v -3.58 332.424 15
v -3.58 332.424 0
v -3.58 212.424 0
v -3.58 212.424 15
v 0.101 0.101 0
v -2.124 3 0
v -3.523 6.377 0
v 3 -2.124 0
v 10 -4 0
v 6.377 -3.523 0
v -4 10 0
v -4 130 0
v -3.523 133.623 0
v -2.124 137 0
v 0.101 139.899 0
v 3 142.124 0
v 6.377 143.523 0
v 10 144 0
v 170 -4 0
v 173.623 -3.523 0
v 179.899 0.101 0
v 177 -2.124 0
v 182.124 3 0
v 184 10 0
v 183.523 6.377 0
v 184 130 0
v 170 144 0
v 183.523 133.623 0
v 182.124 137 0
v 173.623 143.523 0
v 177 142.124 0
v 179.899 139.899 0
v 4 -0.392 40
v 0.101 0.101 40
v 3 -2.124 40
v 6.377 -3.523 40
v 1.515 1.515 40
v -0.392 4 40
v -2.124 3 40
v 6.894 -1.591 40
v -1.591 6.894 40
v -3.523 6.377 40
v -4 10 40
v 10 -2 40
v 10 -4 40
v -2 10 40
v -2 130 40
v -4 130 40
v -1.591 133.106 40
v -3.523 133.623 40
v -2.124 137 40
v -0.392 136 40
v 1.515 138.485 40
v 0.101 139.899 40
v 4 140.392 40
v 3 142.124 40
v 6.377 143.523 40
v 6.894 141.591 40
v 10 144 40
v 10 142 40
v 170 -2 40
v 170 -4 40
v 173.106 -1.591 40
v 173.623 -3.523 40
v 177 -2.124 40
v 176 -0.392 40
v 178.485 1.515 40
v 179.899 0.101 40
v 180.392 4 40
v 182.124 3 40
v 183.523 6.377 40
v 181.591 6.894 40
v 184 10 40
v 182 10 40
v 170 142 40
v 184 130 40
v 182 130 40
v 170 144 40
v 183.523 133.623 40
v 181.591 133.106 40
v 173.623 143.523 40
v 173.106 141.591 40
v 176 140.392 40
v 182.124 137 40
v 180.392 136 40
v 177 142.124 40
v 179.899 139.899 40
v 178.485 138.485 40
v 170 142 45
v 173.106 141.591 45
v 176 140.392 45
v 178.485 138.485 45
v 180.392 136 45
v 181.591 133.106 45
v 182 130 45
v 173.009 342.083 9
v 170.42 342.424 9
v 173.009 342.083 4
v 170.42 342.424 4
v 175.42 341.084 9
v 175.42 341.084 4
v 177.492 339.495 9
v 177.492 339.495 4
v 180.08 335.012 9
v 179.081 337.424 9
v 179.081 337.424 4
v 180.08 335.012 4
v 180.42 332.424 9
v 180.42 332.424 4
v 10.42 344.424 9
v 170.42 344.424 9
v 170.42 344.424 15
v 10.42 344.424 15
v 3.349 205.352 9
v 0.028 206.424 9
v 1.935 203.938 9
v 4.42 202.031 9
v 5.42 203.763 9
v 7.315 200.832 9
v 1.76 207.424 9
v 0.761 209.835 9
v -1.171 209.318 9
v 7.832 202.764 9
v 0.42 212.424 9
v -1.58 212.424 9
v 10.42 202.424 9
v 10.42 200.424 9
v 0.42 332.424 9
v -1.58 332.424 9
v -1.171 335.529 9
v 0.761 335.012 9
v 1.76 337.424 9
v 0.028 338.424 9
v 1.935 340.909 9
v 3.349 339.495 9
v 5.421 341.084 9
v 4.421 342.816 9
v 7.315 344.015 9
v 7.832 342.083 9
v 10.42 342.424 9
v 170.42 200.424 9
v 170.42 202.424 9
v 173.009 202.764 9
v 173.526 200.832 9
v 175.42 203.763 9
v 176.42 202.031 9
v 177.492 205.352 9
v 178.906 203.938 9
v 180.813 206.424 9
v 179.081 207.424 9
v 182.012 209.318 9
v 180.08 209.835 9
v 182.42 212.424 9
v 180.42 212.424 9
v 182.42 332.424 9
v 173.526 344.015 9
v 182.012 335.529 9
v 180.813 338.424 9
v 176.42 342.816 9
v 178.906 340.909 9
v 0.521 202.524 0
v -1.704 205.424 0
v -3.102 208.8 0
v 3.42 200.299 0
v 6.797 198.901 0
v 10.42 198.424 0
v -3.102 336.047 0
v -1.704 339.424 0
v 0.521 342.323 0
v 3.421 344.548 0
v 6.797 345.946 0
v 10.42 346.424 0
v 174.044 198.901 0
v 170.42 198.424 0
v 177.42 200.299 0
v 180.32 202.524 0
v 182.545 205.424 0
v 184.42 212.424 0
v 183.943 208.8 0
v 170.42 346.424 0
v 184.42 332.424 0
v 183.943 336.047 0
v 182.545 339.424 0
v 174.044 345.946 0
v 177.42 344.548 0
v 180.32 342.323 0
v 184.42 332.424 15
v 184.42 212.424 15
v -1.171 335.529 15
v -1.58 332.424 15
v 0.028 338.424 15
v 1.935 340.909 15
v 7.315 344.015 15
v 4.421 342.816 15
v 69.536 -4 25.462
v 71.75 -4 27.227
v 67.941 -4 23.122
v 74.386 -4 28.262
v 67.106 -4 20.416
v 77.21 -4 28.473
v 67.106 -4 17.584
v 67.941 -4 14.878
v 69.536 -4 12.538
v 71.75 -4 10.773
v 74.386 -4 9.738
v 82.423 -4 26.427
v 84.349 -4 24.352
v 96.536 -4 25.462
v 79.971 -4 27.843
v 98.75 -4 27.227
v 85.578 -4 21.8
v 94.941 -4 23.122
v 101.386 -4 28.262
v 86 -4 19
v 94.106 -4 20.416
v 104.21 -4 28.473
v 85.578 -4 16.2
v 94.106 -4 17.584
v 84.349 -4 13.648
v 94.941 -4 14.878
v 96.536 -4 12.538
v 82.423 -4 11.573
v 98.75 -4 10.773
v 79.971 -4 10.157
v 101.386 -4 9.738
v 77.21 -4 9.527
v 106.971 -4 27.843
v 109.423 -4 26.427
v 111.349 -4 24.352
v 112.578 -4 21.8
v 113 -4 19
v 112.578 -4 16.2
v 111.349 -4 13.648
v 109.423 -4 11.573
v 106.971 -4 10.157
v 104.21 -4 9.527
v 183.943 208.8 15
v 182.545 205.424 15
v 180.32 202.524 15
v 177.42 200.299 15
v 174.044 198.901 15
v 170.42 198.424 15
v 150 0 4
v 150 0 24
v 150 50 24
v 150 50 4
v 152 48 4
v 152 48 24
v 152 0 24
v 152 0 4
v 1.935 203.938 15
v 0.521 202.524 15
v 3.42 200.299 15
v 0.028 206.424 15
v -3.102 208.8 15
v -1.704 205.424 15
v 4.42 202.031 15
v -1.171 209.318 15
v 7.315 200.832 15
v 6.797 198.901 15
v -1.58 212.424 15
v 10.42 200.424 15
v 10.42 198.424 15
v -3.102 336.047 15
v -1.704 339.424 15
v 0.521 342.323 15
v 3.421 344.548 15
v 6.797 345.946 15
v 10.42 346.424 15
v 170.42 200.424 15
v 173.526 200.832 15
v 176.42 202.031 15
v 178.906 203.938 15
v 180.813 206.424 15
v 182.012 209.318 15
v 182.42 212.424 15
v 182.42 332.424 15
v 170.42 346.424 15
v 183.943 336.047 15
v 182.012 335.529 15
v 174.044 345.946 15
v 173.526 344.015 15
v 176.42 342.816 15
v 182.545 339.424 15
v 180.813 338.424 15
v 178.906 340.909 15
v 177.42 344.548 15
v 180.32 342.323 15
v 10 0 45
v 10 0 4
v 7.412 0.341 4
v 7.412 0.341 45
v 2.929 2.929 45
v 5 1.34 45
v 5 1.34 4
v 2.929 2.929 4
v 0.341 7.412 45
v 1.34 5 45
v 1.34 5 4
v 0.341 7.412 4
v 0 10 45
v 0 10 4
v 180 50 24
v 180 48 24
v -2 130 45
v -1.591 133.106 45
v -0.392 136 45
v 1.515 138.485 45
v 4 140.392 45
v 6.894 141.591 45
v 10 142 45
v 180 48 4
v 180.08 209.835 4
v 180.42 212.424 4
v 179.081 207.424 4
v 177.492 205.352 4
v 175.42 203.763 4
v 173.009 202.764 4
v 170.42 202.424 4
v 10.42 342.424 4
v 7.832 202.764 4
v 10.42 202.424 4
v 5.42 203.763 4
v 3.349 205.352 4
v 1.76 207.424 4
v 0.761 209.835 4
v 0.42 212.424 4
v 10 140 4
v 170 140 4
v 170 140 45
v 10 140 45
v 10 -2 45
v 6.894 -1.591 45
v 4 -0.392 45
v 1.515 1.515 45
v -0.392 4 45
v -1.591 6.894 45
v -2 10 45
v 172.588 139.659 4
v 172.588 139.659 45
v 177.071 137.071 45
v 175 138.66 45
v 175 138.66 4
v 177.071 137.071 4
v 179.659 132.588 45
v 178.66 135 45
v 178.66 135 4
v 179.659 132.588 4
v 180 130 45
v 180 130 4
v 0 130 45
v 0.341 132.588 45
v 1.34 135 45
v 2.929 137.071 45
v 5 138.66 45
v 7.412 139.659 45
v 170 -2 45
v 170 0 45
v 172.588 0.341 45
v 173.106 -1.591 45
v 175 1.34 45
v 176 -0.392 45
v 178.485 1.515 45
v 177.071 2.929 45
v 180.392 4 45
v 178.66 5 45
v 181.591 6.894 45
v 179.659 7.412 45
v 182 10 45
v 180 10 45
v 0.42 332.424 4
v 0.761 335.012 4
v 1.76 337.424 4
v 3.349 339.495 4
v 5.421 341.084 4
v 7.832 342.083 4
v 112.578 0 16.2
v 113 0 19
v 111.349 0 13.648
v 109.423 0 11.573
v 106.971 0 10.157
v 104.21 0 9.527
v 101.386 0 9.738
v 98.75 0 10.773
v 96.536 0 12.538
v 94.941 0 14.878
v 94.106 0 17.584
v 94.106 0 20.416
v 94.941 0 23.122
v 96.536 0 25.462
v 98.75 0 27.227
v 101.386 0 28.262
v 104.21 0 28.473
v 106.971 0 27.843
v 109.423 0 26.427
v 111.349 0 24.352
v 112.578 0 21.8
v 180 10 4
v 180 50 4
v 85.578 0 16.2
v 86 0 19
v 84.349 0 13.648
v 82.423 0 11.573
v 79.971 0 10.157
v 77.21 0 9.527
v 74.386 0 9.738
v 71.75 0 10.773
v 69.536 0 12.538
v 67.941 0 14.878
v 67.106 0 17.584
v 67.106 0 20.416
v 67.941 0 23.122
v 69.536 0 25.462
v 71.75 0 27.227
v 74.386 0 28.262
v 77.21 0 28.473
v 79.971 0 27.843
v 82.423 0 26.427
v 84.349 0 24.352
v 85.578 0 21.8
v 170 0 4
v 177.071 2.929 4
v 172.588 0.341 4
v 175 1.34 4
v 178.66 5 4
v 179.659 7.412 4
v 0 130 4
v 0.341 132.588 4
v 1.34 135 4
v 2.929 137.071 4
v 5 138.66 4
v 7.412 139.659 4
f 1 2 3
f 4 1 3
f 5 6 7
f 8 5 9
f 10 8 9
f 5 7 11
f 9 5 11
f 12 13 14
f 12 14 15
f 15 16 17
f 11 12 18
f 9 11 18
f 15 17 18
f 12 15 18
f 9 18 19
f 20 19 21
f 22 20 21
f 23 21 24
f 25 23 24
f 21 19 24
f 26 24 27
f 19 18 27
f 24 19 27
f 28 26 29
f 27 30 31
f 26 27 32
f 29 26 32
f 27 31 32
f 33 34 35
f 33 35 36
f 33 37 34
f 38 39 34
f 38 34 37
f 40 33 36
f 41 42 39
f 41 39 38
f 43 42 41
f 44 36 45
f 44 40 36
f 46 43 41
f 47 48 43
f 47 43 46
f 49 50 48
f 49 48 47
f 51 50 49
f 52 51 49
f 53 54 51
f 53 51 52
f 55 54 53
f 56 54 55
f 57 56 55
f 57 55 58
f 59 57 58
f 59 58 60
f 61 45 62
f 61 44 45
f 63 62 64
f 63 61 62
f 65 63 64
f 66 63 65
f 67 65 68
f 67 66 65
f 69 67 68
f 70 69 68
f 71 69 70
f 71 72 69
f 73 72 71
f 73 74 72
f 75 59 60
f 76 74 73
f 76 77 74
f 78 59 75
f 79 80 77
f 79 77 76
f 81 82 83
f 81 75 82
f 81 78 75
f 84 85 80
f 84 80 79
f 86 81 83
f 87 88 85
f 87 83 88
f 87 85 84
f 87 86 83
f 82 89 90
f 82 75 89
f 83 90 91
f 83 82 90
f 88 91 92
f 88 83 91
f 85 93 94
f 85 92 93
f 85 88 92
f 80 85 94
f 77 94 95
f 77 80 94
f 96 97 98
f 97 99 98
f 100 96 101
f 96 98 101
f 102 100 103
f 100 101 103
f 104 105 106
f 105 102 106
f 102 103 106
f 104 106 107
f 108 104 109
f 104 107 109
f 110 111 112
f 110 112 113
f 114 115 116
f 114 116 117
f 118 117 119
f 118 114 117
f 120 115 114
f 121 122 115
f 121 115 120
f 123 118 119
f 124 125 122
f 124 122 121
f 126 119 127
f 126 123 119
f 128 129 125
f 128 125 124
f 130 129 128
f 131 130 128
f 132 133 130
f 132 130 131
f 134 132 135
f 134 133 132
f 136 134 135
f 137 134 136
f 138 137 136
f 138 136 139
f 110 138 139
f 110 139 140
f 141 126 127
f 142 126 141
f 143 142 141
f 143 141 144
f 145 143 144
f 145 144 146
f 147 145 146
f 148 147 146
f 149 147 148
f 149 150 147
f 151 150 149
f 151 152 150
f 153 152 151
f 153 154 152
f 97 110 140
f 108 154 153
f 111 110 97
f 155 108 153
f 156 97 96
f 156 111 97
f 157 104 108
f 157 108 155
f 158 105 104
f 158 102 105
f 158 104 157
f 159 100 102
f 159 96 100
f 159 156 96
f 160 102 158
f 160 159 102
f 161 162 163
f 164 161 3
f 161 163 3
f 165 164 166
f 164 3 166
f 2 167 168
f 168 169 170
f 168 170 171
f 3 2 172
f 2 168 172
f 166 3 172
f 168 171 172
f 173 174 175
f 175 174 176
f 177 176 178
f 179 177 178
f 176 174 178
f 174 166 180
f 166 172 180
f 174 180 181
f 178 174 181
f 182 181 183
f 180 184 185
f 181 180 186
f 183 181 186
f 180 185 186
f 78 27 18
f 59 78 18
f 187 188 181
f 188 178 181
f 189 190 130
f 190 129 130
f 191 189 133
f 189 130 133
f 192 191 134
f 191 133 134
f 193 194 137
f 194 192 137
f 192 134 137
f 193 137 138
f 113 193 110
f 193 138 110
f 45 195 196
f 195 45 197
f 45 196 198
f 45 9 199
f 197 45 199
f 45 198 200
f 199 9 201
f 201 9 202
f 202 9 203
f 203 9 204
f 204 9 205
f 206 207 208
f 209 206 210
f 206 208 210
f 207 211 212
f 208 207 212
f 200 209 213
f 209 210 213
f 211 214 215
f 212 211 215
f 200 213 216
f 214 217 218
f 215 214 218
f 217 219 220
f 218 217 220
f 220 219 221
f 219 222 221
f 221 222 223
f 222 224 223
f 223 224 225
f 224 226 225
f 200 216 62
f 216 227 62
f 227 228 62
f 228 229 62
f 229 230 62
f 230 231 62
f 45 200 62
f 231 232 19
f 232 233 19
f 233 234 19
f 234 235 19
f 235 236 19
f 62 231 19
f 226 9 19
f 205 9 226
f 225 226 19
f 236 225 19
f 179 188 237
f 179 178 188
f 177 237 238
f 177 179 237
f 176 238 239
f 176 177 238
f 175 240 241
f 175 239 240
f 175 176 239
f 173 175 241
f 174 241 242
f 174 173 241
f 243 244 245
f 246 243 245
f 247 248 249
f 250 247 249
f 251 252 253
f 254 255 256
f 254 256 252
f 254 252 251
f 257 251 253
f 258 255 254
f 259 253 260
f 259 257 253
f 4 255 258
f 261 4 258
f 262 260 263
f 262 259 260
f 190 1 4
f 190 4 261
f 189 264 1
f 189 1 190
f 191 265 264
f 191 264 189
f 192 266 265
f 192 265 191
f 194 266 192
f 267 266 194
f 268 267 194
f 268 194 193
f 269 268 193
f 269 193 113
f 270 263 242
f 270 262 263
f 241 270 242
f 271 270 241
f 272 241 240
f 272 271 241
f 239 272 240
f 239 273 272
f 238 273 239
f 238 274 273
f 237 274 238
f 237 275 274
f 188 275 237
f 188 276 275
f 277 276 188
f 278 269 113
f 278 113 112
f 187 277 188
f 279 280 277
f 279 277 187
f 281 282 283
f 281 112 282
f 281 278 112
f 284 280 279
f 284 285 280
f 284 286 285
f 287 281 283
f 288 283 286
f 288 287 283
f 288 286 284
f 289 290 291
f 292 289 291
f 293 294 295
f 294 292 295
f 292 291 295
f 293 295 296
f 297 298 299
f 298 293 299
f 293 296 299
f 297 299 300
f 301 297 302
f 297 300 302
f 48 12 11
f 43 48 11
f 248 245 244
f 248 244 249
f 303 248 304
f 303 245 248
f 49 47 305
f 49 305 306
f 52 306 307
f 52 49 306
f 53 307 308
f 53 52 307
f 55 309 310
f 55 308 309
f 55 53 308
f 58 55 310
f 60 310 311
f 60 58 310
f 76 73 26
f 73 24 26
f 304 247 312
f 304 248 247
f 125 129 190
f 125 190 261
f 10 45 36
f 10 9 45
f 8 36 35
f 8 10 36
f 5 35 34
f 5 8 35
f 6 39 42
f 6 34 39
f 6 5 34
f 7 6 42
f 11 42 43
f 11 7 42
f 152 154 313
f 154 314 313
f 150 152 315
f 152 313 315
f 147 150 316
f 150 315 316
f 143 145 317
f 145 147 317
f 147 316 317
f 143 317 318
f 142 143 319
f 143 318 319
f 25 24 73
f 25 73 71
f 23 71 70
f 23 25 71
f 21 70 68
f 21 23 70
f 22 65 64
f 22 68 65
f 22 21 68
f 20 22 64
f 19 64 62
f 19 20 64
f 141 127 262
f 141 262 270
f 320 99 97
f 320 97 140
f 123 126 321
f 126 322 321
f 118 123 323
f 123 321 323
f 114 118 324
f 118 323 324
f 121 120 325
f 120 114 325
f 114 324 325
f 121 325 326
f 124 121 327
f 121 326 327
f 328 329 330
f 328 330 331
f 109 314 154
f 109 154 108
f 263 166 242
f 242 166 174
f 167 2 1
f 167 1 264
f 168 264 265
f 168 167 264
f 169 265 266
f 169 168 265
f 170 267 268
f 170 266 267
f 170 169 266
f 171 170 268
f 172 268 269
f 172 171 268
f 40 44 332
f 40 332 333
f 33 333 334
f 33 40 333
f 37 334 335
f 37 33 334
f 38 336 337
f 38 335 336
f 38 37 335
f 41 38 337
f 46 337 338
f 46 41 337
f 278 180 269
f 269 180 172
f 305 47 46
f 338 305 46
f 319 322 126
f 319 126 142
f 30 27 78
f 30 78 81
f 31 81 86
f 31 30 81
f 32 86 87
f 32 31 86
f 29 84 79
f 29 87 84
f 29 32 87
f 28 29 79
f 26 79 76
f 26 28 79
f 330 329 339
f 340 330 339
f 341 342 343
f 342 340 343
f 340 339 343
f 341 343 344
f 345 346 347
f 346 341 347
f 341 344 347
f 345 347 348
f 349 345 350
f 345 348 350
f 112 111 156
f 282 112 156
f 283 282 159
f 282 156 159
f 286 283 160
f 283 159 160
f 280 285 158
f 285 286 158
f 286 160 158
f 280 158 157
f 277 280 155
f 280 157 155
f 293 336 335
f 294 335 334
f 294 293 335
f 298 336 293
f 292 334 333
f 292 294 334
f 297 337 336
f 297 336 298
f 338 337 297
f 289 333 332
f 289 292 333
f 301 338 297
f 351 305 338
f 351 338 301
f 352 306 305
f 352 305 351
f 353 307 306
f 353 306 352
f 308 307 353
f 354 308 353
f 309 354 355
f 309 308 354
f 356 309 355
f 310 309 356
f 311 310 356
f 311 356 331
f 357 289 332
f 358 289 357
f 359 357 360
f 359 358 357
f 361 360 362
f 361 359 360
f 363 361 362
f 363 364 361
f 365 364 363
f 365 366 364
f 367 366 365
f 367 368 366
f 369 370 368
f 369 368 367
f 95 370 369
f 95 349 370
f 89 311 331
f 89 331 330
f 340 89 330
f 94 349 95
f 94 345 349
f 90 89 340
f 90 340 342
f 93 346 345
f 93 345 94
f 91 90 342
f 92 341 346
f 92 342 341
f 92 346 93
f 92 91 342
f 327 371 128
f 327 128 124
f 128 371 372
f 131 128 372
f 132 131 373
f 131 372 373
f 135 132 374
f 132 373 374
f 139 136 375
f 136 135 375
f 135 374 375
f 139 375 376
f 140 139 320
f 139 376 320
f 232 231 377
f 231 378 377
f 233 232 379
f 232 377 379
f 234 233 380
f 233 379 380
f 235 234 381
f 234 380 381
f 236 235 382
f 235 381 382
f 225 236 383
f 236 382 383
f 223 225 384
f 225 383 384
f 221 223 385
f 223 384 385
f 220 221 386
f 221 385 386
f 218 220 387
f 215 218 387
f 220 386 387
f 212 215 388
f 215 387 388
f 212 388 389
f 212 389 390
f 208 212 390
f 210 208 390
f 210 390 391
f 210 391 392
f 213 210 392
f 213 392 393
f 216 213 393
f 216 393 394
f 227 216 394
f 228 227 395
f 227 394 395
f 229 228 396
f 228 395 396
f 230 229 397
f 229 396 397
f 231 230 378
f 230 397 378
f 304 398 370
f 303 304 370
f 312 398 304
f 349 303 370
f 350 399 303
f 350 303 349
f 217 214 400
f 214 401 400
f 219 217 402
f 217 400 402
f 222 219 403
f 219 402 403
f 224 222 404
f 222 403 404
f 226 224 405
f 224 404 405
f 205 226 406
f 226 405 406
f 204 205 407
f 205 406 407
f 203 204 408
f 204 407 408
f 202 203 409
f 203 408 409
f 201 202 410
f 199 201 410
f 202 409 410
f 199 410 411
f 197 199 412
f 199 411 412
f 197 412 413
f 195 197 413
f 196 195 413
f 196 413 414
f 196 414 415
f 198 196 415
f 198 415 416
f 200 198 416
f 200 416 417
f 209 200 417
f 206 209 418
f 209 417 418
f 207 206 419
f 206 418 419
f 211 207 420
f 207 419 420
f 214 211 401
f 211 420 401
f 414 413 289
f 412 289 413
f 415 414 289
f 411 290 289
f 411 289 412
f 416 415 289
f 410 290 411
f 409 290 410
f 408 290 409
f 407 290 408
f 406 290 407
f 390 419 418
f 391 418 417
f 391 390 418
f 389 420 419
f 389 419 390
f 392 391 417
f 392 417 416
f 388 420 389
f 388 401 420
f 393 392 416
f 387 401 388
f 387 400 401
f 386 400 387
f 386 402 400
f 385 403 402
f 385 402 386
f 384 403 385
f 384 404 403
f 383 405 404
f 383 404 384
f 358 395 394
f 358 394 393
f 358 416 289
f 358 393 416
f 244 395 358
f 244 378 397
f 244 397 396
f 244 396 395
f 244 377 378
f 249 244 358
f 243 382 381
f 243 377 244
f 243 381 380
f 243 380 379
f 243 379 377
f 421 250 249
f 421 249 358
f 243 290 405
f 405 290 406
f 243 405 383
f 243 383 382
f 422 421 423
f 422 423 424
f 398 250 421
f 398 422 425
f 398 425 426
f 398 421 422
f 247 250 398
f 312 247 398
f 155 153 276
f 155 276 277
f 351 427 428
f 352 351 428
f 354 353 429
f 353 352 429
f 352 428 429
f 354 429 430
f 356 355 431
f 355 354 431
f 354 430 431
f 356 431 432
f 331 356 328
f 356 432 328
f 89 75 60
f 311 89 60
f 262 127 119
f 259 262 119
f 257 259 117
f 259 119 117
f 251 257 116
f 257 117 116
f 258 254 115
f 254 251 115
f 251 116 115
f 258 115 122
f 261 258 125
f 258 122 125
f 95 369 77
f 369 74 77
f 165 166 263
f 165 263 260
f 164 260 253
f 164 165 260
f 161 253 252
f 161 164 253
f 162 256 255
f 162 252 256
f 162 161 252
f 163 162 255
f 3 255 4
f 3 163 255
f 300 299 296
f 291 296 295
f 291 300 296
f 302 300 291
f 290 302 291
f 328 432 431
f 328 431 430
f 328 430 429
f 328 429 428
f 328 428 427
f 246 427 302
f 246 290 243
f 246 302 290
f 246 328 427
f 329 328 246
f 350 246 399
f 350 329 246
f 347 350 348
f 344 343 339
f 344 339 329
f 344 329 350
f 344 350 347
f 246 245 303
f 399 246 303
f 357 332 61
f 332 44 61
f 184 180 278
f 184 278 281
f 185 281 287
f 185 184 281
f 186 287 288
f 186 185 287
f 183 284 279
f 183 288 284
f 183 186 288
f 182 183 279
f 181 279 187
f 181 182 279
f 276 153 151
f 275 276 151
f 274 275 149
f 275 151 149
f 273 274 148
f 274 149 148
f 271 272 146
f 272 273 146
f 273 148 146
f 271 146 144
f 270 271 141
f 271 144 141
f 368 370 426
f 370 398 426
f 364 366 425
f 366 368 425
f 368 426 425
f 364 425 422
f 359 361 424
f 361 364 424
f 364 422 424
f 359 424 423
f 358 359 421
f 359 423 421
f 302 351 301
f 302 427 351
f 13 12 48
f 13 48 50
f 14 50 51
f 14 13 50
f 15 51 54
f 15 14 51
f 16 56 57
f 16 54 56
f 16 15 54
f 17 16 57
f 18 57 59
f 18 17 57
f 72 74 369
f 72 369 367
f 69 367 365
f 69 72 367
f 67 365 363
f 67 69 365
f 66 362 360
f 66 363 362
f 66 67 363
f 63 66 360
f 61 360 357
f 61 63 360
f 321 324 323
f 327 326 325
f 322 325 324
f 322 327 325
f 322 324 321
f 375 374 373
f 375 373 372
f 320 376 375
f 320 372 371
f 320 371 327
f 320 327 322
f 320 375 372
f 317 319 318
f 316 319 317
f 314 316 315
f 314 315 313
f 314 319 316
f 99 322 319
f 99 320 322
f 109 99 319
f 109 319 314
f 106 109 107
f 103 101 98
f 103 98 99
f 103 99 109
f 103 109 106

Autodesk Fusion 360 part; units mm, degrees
sketch "Sketch1" plane through (0, 0, 0) normal (0, 0, 1) x (1, 0, 0)
  line L0 (10, 0) -> (170, 0)
  line L1 (180, 10) -> (180, 130)
  line L2 (170, 140) -> (10, 140)
  line L3 (0, 130) -> (0, 10)
  arc A0 (10, 140) -> (0, 130) centre (10, 130) ccw
  arc A1 (0, 10) -> (10, 0) centre (10, 10) ccw
  arc A2 (170, 0) -> (180, 10) centre (170, 10) ccw
  arc A3 (180, 130) -> (170, 140) centre (170, 130) ccw
  arc A4 (180, 130) -> (170, 140) centre (170, 130) ccw
  arc A5 (170, 0) -> (180, 10) centre (170, 10) ccw
  line L4 (-4, 130) -> (-4, 10)
  arc A6 (-4, 10) -> (10, -4) centre (10, 10) ccw
  line L5 (10, -4) -> (170, -4)
  arc A7 (170, -4) -> (184, 10) centre (170, 10) ccw
  line L6 (184, 10) -> (184, 130)
  arc A8 (184, 130) -> (170, 144) centre (170, 130) ccw
  line L7 (170, 144) -> (10, 144)
  arc A9 (10, 144) -> (-4, 130) centre (10, 130) ccw
  line L8 (-2, 130) -> (-2, 10)
  arc A10 (-2, 10) -> (10, -2) centre (10, 10) ccw
  line L9 (10, -2) -> (170, -2)
  arc A11 (170, -2) -> (182, 10) centre (170, 10) ccw
  line L10 (182, 10) -> (182, 130)
  arc A12 (182, 130) -> (170, 142) centre (170, 130) ccw
  line L11 (170, 142) -> (10, 142)
  arc A13 (10, 142) -> (-2, 130) centre (10, 130) ccw
  arc A14 (10, 142) -> (-2, 130) centre (10, 130) ccw
  arc A15 (170, -2) -> (182, 10) centre (170, 10) ccw
  line L12 (0, 130) -> (0, 10)
  line L13 (10, -4) -> (170, -4)
  arc A16 (170, 0) -> (180, 10) centre (170, 10) ccw
  line L14 (-4, 130) -> (-4, 10)
  line L15 (170, 144) -> (10, 144)
  arc A17 (184, 130) -> (170, 144) centre (170, 130) ccw
  arc A18 (10, 144) -> (-4, 130) centre (10, 130) ccw
  line L16 (10, 0) -> (170, 0)
  line L17 (-2, 130) -> (-2, 10)
  arc A19 (182, 130) -> (170, 142) centre (170, 130) ccw
  arc A20 (180, 130) -> (170, 140) centre (170, 130) ccw
  arc A21 (0, 10) -> (10, 0) centre (10, 10) ccw
  line L18 (10, -2) -> (170, -2)
  line L19 (170, 140) -> (10, 140)
  arc A22 (170, -4) -> (184, 10) centre (170, 10) ccw
  line L20 (170, 142) -> (10, 142)
  line L21 (180, 10) -> (180, 130)
  line L22 (182, 10) -> (182, 130)
  arc A23 (180, 130) -> (170, 140) centre (170, 130) ccw
  line L23 (184, 10) -> (184, 130)
  arc A24 (-4, 10) -> (10, -4) centre (10, 10) ccw
  arc A25 (10, 140) -> (0, 130) centre (10, 130) ccw
  arc A26 (170, 0) -> (180, 10) centre (170, 10) ccw
  arc A27 (-2, 10) -> (10, -2) centre (10, 10) ccw
  arc A28 (10.4205, 344.4235) -> (-1.5795, 332.4235) centre (10.4205, 332.4235) ccw
  arc A29 (170.4205, 200.4235) -> (182.4205, 212.4235) centre (170.4205, 212.4235) ccw
  line L24 (0.4205, 332.4235) -> (0.4205, 212.4235)
  line L25 (10.4205, 198.4235) -> (170.4205, 198.4235)
  arc A30 (170.4205, 202.4235) -> (180.4205, 212.4235) centre (170.4205, 212.4235) ccw
  line L26 (-3.5795, 332.4235) -> (-3.5795, 212.4235)
  line L27 (170.4205, 346.4235) -> (10.4205, 346.4235)
  arc A31 (184.4205, 332.4235) -> (170.4205, 346.4235) centre (170.4205, 332.4235) ccw
  arc A32 (10.4205, 346.4235) -> (-3.5795, 332.4235) centre (10.4205, 332.4235) ccw
  line L28 (10.4205, 202.4235) -> (170.4205, 202.4235)
  line L29 (-1.5795, 332.4235) -> (-1.5795, 212.4235)
  arc A33 (182.4205, 332.4235) -> (170.4205, 344.4235) centre (170.4205, 332.4235) ccw
  arc A34 (180.4205, 332.4235) -> (170.4205, 342.4235) centre (170.4205, 332.4235) ccw
  arc A35 (0.4205, 212.4235) -> (10.4205, 202.4235) centre (10.4205, 212.4235) ccw
  line L30 (10.4205, 200.4235) -> (170.4205, 200.4235)
  line L31 (170.4205, 342.4235) -> (10.4205, 342.4235)
  arc A36 (170.4205, 198.4235) -> (184.4205, 212.4235) centre (170.4205, 212.4235) ccw
  line L32 (170.4205, 344.4235) -> (10.4205, 344.4235)
  line L33 (180.4205, 212.4235) -> (180.4205, 332.4235)
  line L34 (182.4205, 212.4235) -> (182.4205, 332.4235)
  arc A37 (180.4205, 332.4235) -> (170.4205, 342.4235) centre (170.4205, 332.4235) ccw
  line L35 (184.4205, 212.4235) -> (184.4205, 332.4235)
  arc A38 (-3.5795, 212.4235) -> (10.4205, 198.4235) centre (10.4205, 212.4235) ccw
  arc A39 (10.4205, 342.4235) -> (0.4205, 332.4235) centre (10.4205, 332.4235) ccw
  arc A40 (170.4205, 202.4235) -> (180.4205, 212.4235) centre (170.4205, 212.4235) ccw
  arc A41 (-1.5795, 212.4235) -> (10.4205, 200.4235) centre (10.4205, 212.4235) ccw
  point P0 (180, 0)
  point P1 (180, 140)
  point P2 (0, 140)
  point P3 (180, 140)
  point P4 (0, 140)
  point P5 (180, 0)
  point P6 (180.4205, 342.4235)
  point P7 (0.4205, 342.4235)
  point P8 (0.4205, 202.4235)
  point P9 (180.4205, 202.4235)
  dimension "d1" = 140
  dimension "d2" = 180
  dimension "d3" = 10
  dimension "d4" = 4
  dimension "d5" = 2
  dimension "d6" = 4
  dimension "d7" = 2
  dimension "d8" = 140
  dimension "d9" = 180
  dimension "d10" = 10
  dimension "d11" = 4
  dimension "d12" = 2
  dimension "d13" = 140
  dimension "d14" = 180
  dimension "d15" = 10
extrude "Extrude1" add sketch "Sketch1" along normal blind 4 contours L0 L1 L2 L3 A0 A1 A2 A3 A4 A5 L12 A16 L16 A20 A21 L19 L21 A23 A25 A26 | L24 A30 L28 A34 A35 L31 L33 A37 A39 A40 makes body 1 at (63.3333, 93.3333, 0) makes body 2 at (117.0871, 249.0901, 0)
extrude "Extrude2" add sketch "Sketch1" along normal blind 45 contours L8 A10 L9 A11 L10 A12 L11 A13 A14 A15 L17 A19 L18 L20 L22 A27 bodies 1
extrude "Extrude3" add sketch "Sketch1" along normal blind 40 contours L4 A6 L5 A7 L6 A8 L7 A9 L13 L14 L15 A17 A18 A22 L23 A24 bodies 1
extrude "Extrude4" add sketch "Sketch1" along normal blind 9 contours A28 A29 L29 A33 L30 L32 L34 A41 bodies 2
extrude "Extrude5" add sketch "Sketch1" along normal blind 15 contours L25 L26 L27 A31 A32 A36 L35 A38 bodies 2
sketch "Sketch2" plane through (0, 0, 0) normal (0, 1, 0) x (1, 0, 0)
  line L0 (10, -40) -> (170, -40) construction
  line L1 (90, -40) -> (90, -4) construction
  line L2 (90, -4) -> (90, -19) construction
  line L3 (76.5, -19) -> (103.5, -19)
  circle A0 centre (76.5, -19) radius 9.5
  circle A1 centre (103.5, -19) radius 9.5
  dimension "d27" = 15
  dimension "d28" = 27
  dimension "d29" = 19
  dimension "d30" = 19
extrude "Extrude6" cut sketch "Sketch2" against normal blind 4 bodies 1
sketch "Sketch3" plane through (0, 0, 0) normal (0, 0, 1) x (1, 0, 0)
  line L0 (103.6272, 0) -> (72.8355, 0)
  line L1 (72.8355, 0) -> (72.8355, 50)
  line L2 (72.8355, 50) -> (103.6272, 50)
  line L3 (103.6272, 50) -> (103.6272, 0)
  dimension "d33" = 50
ref_plane "WorkPlane1" through (90, 70, 24) normal (0, 0, 1) x (1, 0, 0)
sketch "Sketch4" plane through (90, 70, 24) normal (0, 0, 1) x (1, 0, 0)
  line L0 (90, -70) -> (60, -70)
  line L1 (60, -70) -> (60, -20)
  line L2 (60, -20) -> (90, -20)
  line L3 (90, -20) -> (90, -70)
  line L4 (62, -68) -> (62, -22)
  line L5 (62, -22) -> (88, -22)
  line L6 (88, -22) -> (90, -22)
  line L7 (62, -68) -> (62, -70)
  point P0 (90, -70)
  dimension "d35" = 30
  dimension "d36" = 50
extrude "Extrude7" add sketch "Sketch4" against normal blind 20 contours L0 L1 L2 L3 L4 L5 L6 L7 bodies 1
